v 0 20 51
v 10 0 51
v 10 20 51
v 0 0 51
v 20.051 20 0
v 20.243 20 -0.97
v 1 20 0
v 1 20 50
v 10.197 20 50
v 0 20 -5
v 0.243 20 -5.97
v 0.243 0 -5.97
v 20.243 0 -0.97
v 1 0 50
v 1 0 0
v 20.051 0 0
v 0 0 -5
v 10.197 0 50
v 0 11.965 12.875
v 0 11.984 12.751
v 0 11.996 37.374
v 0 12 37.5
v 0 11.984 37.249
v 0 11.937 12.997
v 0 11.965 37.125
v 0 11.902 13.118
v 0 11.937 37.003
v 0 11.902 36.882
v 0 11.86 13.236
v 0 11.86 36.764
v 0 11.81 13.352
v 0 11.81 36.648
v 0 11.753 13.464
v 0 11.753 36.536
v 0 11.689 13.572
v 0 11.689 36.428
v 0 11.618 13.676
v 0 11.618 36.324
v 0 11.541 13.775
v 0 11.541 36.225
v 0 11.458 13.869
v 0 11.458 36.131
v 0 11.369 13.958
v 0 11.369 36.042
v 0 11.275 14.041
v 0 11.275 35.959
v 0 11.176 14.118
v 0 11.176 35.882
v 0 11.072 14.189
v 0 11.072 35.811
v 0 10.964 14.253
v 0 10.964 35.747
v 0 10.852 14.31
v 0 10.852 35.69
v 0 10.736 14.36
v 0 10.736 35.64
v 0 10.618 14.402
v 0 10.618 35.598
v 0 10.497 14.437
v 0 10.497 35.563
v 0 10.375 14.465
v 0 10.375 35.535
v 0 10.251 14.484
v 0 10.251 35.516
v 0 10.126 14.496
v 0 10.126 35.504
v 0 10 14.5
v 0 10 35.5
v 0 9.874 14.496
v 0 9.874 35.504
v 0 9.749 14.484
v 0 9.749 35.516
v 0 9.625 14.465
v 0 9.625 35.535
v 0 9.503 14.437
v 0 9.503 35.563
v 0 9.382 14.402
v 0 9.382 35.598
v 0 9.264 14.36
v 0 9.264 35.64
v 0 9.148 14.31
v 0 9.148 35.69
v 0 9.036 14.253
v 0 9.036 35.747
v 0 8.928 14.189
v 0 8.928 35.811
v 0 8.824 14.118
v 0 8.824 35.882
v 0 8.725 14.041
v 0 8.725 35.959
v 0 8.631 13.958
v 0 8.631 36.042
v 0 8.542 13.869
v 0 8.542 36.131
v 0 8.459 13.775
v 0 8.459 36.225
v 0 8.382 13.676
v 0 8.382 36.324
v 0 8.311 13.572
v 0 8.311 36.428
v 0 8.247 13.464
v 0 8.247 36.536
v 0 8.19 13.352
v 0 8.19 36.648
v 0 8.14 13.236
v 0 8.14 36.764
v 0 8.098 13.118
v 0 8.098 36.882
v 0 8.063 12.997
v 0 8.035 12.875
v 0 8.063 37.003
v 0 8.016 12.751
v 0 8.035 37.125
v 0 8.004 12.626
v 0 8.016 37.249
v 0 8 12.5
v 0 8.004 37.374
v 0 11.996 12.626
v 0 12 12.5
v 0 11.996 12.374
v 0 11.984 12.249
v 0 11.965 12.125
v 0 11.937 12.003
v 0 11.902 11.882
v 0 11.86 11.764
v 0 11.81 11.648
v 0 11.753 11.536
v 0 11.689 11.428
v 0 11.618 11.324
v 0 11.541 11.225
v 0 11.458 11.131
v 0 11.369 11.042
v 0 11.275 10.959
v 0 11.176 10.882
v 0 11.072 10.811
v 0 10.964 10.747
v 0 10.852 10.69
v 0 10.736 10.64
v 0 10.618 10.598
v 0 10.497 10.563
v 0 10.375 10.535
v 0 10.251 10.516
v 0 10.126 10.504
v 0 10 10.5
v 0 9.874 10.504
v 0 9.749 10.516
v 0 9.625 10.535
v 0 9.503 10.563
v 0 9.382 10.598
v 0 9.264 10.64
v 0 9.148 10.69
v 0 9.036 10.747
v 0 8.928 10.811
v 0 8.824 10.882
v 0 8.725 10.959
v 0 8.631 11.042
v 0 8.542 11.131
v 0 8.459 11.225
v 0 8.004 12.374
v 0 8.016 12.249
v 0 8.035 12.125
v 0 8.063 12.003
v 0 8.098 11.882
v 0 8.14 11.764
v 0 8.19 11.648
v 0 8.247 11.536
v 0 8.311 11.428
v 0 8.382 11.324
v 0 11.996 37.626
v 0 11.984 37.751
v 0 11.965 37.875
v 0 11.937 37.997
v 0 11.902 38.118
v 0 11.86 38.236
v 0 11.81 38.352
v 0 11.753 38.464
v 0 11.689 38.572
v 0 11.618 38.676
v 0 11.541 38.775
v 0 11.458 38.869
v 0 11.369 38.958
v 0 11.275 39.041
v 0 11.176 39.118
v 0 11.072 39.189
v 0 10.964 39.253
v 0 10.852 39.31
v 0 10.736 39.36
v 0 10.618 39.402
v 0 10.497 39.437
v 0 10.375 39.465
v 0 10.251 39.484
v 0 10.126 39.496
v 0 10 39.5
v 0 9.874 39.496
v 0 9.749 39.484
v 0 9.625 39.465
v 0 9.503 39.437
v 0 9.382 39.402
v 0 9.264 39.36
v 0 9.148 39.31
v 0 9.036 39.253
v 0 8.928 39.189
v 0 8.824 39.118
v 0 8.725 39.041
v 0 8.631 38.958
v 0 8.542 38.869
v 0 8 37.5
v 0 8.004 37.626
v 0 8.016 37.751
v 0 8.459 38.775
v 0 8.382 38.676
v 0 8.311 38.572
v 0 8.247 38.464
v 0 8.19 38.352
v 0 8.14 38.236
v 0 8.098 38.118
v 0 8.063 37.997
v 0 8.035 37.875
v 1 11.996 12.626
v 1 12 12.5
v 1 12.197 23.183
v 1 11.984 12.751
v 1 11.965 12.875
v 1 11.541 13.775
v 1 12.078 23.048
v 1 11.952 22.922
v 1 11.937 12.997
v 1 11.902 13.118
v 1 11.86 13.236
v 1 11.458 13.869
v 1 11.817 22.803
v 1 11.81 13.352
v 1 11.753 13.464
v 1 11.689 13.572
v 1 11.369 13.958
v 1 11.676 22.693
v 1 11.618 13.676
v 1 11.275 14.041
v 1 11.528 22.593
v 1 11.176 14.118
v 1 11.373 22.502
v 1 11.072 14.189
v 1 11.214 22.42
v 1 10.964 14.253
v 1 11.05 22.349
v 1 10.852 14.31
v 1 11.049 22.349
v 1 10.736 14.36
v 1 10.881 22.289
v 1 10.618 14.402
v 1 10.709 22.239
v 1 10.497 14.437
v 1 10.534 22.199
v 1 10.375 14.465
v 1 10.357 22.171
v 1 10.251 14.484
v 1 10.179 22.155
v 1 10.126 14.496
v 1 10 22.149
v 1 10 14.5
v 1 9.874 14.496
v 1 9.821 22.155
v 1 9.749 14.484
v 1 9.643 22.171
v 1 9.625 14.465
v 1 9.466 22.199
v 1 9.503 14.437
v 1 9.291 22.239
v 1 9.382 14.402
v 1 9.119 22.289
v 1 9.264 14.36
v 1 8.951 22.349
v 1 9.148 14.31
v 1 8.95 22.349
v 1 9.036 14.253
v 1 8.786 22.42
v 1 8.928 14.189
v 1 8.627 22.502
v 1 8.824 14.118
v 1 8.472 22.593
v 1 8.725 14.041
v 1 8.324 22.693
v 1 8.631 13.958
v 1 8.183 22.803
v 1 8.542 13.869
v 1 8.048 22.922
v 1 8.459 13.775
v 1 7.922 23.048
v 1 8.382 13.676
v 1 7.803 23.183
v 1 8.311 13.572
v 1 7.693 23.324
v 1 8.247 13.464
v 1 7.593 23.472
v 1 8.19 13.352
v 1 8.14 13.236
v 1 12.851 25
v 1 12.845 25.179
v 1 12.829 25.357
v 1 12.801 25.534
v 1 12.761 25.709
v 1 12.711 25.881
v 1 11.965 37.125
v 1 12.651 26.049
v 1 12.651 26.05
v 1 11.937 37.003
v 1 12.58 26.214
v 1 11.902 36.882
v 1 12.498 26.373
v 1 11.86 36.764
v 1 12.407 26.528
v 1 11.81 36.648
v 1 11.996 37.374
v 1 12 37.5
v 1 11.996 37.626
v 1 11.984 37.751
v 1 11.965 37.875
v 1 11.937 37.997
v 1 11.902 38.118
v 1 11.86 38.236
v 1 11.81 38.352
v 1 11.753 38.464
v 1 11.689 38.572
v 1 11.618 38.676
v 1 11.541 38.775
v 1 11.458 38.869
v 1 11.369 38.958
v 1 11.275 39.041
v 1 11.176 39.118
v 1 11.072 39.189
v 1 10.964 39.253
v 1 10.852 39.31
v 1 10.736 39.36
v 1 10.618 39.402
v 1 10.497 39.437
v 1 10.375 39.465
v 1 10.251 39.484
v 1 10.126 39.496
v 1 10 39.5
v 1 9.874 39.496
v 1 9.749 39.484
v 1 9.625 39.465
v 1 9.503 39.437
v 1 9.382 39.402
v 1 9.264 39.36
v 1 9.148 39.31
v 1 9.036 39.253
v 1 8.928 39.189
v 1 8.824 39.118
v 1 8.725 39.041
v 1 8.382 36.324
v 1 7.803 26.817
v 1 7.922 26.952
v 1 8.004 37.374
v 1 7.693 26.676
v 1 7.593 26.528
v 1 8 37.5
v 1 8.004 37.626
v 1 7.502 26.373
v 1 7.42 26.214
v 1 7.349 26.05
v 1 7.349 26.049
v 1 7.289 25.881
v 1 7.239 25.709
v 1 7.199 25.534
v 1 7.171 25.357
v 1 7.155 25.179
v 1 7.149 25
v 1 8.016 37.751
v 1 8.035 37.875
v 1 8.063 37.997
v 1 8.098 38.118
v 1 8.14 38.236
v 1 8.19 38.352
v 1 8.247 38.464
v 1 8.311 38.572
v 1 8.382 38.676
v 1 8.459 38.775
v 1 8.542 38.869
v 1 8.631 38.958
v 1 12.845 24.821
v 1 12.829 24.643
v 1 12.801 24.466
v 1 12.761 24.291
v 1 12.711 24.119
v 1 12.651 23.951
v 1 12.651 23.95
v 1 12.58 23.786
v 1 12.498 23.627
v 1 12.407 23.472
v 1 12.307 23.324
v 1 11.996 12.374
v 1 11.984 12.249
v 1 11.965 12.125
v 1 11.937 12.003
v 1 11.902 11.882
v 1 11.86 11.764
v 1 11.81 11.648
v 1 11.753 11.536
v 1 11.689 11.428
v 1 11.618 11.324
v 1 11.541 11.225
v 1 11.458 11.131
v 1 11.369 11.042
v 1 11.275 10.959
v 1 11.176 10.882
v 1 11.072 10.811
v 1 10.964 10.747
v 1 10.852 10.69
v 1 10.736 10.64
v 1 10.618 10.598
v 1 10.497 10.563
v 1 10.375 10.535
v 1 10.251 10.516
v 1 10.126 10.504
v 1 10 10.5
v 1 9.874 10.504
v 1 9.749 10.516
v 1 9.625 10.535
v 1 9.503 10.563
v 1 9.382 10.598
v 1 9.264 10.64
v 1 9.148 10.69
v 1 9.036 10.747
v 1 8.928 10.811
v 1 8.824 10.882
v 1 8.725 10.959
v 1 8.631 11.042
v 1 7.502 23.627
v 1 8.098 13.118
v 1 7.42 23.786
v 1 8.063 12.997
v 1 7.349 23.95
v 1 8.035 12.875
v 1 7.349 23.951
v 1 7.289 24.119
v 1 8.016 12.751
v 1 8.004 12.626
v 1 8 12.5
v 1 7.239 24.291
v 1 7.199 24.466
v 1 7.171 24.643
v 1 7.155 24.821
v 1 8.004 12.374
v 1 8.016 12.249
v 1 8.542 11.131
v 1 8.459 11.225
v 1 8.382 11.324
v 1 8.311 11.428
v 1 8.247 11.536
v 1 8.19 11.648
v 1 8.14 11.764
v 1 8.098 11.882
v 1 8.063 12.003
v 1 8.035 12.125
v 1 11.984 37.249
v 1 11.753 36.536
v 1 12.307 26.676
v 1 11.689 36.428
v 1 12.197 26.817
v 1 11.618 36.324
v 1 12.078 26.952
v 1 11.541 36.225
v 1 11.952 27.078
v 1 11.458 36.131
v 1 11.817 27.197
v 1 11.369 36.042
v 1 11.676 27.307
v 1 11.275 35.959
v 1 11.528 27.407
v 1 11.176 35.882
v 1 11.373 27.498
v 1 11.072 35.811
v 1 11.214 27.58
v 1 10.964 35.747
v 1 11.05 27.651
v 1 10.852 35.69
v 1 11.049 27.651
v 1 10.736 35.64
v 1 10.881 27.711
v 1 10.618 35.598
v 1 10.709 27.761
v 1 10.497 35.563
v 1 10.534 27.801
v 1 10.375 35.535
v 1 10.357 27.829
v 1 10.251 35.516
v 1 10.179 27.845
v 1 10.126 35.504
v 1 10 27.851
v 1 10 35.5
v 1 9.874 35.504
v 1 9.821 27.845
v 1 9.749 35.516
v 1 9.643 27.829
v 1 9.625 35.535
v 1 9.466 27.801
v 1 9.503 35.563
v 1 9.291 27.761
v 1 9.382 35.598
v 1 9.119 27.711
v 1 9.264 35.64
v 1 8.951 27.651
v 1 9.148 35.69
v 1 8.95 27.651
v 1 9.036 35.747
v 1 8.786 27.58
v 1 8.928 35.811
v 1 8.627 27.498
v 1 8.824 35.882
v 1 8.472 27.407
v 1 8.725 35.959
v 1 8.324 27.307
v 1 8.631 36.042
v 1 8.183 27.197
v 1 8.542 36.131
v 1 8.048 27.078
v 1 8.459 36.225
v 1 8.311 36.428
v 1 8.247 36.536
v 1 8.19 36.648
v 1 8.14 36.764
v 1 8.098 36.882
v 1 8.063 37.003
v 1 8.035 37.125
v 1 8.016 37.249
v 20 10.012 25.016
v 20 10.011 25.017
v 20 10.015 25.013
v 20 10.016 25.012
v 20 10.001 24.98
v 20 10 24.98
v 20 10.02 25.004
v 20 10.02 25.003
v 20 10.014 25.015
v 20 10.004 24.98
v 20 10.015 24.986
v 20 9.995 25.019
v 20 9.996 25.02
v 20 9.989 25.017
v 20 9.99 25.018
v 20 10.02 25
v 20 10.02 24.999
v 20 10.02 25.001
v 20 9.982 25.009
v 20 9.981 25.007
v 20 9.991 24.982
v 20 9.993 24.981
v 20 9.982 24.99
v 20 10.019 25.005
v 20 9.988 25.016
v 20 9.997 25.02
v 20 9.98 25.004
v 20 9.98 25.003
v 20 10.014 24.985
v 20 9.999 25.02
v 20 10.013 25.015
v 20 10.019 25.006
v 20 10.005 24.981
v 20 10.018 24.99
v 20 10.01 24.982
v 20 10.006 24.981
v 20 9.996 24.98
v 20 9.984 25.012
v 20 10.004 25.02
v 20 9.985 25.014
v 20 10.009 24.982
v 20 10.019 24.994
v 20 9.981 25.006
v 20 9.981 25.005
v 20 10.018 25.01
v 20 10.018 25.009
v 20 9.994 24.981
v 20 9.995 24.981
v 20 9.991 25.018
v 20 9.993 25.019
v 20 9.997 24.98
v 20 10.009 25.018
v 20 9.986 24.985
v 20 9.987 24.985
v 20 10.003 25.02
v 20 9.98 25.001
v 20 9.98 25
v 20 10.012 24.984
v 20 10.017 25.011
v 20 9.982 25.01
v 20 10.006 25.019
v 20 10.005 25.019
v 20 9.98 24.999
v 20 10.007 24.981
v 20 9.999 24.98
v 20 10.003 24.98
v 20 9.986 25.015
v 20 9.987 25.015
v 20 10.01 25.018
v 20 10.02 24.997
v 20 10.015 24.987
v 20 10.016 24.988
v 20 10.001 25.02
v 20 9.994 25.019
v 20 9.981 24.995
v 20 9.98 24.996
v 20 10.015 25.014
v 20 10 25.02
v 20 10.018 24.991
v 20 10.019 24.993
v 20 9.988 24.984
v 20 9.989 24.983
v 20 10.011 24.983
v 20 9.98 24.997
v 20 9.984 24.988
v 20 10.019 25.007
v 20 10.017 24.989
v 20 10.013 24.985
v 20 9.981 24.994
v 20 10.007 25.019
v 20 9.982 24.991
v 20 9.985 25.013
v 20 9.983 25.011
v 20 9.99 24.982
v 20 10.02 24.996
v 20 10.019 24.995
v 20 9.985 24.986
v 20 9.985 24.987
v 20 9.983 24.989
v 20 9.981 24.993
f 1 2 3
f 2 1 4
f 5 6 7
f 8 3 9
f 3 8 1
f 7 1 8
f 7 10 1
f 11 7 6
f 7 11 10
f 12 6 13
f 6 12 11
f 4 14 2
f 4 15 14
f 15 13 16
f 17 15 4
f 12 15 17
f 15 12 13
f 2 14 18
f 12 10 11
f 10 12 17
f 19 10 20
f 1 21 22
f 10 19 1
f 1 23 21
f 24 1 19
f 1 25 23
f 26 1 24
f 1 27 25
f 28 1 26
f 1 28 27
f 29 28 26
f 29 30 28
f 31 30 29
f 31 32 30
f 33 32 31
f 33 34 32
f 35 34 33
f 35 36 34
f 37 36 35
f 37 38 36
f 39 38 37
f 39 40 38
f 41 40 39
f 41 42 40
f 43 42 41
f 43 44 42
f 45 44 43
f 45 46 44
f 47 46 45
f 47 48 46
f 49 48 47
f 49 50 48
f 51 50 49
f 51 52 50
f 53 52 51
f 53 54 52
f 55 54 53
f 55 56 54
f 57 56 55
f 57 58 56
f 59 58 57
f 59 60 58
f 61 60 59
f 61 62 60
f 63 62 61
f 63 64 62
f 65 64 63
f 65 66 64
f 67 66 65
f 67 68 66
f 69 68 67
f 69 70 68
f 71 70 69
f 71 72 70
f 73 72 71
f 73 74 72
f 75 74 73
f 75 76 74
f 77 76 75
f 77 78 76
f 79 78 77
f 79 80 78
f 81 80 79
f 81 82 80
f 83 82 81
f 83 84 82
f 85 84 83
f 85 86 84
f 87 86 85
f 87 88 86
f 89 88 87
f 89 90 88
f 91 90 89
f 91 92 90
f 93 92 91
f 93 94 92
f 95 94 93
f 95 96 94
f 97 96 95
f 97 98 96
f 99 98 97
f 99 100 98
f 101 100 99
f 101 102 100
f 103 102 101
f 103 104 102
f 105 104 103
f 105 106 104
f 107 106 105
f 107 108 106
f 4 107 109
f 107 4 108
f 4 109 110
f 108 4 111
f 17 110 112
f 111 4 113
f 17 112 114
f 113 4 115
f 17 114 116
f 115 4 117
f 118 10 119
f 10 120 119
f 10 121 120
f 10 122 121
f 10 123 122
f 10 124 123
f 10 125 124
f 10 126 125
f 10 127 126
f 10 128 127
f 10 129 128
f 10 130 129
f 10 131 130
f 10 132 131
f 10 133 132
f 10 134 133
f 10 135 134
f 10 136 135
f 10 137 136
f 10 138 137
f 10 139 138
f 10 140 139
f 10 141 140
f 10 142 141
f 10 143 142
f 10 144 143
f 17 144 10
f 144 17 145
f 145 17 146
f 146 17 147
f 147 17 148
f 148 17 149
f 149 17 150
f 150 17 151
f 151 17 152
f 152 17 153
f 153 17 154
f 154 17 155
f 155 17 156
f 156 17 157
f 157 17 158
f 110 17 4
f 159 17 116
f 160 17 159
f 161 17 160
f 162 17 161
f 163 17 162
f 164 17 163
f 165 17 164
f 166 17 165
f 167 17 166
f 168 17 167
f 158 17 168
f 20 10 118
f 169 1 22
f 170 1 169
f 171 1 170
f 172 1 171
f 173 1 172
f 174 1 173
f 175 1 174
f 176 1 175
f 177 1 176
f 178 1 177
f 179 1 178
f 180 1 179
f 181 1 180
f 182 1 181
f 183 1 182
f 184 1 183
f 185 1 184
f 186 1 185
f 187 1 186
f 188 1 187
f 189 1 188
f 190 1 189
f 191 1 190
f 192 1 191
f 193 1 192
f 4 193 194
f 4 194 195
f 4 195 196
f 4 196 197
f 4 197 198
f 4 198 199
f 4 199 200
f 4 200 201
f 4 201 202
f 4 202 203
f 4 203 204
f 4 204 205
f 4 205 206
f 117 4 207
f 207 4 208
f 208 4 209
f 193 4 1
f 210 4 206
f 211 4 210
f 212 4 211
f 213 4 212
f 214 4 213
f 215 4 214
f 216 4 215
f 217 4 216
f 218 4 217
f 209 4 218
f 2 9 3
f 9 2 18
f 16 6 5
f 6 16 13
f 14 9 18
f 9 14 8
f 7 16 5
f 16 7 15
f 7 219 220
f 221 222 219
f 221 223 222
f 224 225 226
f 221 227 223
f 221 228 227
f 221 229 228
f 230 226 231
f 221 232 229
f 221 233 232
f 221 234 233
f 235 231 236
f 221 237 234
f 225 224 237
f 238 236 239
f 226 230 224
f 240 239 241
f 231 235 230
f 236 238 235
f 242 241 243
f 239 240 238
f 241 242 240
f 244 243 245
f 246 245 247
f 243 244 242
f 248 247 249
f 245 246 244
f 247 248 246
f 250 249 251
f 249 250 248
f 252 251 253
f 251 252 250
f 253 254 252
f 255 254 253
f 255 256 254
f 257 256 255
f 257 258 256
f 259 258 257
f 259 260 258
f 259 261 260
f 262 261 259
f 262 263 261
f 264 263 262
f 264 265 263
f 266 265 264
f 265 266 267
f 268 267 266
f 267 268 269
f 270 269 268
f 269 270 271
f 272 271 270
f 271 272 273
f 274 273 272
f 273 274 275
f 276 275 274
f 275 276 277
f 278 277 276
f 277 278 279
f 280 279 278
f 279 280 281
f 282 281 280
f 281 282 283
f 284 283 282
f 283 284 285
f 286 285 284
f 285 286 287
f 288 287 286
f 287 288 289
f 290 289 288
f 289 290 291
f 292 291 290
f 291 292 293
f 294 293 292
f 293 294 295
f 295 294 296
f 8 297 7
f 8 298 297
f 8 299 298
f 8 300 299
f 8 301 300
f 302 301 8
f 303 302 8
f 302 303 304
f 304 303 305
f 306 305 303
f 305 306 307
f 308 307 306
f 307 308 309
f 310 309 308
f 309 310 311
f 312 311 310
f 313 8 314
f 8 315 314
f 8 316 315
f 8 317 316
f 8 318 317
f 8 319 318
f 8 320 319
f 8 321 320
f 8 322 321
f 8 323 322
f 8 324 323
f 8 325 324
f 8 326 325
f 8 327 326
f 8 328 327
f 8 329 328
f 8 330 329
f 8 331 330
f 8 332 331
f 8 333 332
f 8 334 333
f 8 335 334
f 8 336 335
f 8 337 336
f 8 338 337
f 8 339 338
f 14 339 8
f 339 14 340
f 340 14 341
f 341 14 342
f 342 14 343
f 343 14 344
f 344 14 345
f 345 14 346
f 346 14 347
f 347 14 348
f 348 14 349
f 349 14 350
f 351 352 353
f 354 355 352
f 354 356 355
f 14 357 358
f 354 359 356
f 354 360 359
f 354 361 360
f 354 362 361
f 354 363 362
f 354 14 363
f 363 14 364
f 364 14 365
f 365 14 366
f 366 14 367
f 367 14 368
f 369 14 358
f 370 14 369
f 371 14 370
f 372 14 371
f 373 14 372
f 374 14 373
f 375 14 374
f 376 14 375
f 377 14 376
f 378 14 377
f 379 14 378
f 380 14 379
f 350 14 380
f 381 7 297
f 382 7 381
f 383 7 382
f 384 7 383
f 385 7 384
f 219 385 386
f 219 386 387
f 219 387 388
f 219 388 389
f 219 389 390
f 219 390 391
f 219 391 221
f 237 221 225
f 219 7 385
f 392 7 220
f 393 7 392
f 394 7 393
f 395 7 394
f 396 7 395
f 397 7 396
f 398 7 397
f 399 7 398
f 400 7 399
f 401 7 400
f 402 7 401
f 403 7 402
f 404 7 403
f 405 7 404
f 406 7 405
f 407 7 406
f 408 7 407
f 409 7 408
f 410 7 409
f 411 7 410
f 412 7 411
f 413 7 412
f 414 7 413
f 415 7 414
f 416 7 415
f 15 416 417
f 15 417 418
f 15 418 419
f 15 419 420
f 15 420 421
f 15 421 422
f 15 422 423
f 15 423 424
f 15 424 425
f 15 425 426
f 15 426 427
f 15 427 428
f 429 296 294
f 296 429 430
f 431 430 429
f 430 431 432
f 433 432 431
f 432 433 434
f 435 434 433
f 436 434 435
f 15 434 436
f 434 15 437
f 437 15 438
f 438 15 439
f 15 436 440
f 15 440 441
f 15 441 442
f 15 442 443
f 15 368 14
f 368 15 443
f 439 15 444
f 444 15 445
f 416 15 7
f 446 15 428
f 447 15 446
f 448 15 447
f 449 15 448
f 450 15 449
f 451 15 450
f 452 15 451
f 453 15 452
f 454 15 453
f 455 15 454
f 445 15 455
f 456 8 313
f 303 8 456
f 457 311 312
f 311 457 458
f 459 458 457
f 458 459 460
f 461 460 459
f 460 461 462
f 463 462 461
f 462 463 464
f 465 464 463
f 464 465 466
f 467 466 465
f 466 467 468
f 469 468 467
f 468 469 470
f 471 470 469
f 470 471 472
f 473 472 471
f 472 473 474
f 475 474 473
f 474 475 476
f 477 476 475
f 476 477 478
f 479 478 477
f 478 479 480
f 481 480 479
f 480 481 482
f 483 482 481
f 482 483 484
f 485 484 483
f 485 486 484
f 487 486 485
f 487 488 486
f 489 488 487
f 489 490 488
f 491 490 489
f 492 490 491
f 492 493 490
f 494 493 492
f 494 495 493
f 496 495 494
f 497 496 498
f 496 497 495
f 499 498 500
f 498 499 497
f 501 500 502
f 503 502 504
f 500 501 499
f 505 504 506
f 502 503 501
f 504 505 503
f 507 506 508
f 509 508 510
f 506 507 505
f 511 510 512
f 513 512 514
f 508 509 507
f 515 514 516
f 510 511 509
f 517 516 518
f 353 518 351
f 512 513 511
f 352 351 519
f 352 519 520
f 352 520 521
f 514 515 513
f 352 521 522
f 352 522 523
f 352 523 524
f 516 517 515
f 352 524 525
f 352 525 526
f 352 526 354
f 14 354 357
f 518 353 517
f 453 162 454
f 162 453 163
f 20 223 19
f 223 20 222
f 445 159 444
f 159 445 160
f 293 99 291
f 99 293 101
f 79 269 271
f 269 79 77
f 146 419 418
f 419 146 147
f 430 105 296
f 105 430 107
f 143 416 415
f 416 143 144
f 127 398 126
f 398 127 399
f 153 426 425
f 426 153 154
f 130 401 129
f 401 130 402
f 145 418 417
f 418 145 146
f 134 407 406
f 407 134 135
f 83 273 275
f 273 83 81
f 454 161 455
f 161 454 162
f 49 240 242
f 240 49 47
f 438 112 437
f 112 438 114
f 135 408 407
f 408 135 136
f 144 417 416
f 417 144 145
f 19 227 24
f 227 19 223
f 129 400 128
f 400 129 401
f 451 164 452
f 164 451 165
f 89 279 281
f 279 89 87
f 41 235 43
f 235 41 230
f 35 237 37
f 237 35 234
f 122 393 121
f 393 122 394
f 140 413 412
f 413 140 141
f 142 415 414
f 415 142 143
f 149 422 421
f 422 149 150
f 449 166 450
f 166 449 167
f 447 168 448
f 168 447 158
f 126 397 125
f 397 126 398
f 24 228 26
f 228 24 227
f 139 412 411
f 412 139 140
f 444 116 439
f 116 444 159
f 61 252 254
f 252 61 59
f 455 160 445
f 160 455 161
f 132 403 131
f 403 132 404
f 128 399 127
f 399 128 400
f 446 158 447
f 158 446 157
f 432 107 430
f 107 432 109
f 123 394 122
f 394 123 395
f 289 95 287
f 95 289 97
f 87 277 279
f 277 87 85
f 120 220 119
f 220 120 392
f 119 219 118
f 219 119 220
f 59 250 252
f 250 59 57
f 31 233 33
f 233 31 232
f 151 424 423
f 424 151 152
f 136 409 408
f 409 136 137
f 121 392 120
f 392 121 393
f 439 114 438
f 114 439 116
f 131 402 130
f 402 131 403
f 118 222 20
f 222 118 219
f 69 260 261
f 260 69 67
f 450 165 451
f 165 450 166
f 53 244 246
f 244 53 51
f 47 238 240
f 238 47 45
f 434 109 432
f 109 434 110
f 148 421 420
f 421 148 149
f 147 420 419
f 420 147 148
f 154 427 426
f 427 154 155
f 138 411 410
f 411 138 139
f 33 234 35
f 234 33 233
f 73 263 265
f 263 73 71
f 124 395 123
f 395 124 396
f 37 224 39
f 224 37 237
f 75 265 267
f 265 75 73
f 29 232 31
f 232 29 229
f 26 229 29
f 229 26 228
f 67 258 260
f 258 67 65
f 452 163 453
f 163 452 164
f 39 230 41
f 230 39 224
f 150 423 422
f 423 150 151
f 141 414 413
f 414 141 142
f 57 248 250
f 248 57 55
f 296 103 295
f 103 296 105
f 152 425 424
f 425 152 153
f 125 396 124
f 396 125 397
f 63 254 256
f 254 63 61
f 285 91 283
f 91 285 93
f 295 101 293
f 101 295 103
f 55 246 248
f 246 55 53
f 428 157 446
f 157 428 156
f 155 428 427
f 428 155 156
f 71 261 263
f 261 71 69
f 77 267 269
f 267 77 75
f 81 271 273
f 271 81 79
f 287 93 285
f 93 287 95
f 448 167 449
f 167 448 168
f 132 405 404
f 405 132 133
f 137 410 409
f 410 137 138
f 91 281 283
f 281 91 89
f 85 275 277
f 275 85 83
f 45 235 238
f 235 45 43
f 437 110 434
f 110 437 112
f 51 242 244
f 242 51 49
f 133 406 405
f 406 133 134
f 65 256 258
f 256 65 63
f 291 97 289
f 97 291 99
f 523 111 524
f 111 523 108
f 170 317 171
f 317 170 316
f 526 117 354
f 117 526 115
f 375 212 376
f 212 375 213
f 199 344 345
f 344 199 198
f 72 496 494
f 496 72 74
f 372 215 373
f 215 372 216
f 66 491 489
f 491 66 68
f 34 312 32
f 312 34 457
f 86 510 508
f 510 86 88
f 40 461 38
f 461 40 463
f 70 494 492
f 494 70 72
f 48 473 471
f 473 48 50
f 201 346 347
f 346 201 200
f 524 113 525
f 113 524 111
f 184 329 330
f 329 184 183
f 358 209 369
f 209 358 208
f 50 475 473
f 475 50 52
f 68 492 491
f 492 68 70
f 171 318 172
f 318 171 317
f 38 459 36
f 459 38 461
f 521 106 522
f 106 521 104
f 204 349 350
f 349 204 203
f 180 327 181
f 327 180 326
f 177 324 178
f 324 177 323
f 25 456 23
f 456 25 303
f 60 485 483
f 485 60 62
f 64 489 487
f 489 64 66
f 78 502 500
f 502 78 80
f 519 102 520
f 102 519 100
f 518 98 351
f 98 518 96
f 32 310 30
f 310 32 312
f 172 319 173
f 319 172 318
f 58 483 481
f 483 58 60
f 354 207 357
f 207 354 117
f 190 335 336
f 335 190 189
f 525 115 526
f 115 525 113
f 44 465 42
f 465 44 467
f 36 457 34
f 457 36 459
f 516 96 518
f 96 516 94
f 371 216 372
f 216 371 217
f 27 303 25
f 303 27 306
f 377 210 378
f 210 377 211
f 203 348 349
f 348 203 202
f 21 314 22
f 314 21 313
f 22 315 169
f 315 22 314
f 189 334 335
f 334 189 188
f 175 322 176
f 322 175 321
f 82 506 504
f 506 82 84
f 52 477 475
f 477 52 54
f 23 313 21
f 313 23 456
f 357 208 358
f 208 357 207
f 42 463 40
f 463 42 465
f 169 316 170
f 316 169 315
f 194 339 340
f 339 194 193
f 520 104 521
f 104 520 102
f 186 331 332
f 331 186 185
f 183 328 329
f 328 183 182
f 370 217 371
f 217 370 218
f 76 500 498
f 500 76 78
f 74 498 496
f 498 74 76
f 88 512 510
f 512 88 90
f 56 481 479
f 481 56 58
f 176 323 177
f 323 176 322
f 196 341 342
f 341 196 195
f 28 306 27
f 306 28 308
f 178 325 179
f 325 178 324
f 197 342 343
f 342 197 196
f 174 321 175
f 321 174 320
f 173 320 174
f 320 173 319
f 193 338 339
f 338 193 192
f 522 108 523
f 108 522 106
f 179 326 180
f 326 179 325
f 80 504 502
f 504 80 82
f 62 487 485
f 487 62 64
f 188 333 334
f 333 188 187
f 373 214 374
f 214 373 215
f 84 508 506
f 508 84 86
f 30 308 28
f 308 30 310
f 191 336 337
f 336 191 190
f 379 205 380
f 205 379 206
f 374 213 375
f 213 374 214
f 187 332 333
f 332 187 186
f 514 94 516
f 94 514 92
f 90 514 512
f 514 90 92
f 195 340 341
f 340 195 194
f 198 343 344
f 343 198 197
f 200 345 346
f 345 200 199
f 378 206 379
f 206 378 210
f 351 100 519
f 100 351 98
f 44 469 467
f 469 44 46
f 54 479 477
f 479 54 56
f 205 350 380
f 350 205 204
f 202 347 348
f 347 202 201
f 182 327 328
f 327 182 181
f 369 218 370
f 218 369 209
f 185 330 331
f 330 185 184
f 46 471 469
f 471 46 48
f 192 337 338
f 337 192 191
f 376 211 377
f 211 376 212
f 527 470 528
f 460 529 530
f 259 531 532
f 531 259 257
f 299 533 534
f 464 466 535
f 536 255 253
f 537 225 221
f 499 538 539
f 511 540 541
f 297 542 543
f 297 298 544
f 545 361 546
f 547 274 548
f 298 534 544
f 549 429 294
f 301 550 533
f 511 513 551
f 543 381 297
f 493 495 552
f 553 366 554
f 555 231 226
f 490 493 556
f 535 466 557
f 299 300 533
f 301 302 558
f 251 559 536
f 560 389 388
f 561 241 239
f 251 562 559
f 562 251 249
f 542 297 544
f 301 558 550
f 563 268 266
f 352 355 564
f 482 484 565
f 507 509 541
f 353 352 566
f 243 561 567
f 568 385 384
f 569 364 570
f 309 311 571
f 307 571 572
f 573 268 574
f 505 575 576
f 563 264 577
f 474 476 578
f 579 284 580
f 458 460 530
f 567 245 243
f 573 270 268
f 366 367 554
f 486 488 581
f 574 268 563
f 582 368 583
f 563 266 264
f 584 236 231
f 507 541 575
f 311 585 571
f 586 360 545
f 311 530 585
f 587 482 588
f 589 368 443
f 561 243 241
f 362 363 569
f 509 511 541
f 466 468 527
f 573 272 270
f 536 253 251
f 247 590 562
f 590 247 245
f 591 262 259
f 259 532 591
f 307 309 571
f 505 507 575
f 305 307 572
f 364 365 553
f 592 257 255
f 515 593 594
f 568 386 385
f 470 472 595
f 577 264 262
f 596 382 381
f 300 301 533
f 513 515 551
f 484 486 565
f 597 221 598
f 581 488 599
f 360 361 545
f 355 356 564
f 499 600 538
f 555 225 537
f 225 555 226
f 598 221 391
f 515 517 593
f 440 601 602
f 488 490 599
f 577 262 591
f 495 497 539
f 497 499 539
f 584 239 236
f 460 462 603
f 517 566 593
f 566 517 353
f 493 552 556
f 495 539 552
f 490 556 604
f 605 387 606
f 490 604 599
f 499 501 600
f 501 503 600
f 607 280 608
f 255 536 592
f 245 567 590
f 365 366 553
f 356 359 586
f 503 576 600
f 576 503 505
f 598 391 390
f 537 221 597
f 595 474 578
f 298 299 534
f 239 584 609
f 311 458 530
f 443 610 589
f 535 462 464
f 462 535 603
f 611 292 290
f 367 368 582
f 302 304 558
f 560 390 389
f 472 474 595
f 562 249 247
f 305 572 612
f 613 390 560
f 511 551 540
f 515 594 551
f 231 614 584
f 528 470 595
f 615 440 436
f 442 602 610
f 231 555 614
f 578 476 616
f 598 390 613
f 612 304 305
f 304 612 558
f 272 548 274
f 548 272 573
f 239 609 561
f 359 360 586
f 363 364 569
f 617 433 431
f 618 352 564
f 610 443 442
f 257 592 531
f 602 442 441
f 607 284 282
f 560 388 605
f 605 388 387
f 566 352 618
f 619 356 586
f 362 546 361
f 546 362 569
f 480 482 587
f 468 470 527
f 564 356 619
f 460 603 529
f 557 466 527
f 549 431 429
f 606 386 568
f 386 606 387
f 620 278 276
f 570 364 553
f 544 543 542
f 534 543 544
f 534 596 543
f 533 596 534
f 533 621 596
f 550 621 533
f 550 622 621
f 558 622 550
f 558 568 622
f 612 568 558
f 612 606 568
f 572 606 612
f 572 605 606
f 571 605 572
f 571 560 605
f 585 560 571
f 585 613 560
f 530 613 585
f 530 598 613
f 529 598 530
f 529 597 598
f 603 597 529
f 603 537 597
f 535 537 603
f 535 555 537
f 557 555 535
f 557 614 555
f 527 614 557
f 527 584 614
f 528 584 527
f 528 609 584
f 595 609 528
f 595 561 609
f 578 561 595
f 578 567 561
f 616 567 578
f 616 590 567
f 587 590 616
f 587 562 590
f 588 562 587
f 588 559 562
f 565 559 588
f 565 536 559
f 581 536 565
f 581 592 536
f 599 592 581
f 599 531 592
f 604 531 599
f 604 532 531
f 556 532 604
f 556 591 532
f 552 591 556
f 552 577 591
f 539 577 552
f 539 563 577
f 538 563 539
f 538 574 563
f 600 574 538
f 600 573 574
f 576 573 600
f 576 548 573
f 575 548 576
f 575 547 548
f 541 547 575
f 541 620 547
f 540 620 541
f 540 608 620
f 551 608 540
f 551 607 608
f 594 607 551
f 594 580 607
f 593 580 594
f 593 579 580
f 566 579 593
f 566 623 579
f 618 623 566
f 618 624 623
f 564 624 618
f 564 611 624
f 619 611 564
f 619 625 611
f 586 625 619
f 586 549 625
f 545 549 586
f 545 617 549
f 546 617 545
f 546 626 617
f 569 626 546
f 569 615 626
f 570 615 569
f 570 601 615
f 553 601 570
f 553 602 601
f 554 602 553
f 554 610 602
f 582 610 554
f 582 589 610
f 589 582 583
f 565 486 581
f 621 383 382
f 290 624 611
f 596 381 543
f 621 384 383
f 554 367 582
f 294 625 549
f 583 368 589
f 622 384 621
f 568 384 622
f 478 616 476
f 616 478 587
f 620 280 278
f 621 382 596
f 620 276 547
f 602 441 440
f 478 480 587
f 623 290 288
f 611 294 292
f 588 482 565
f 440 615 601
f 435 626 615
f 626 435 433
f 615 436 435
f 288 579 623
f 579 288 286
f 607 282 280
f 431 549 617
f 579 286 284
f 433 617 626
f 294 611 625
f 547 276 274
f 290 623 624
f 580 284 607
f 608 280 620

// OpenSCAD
foam_thickness = 50;

bracket_width = 1;
bracket_depth = 20;
bracket_height = foam_thickness;

bottom_support_width = 1;
bottom_support_depth = 20;
// MATH FOR BOTTOM SUPPORT HEIGHT
    bottom_support_a = 5;
    bottom_support_b = 20;
    bottom_support_c = sqrt(pow(bottom_support_a, 2) + pow(bottom_support_b, 2));
    echo(bottom_support_c);
bottom_support_height = bottom_support_c;

// MATH 
bottom_support_angle = 90 - acos(bottom_support_b / bottom_support_c);
echo(bottom_support_height);


spike_height = 20;
spike_bottom_r = 3;
spike_top_r = .02;

// CYLANDER ROUNDNESS
$fn = 100;

// MATH FOR SPIKE PLACEMENT
spike_x_offset = (bracket_height / 4);

screw_height = bracket_width + 2;
screw_r = 2;

difference() {
    hull() {
        cube([bracket_width, bracket_depth, bracket_height]);
        translate([0, 0, (bottom_support_a * -1)]) {
            rotate([0, bottom_support_angle, 0]) {
                cube([bottom_support_width, bottom_support_depth, bottom_support_height]);
            }
        }
        translate([0, 0, (bracket_height + bottom_support_width)]) {
            rotate([0, 90, 0]) {
                cube([bottom_support_width, bottom_support_depth, 10]);
            }
        }    
    }

    translate([bracket_width, 0, 0]) {
        cube([bracket_height, bracket_depth, bracket_height]);
    }
    
    translate([0, (bracket_depth / 2), spike_x_offset]) {
        rotate([0, 90, 0]) {
            cylinder(h=screw_height, r=screw_r);
        }
    }

    translate([0, (bracket_depth / 2), (bracket_height - spike_x_offset)]) {
        rotate([0, 90, 0]) {
            cylinder(h=screw_height, r=screw_r);
        }
    }
}



translate([0, (bracket_depth / 2), (bracket_height / 2)]) {
    rotate([0, 90, 0]) {
        cylinder(spike_height, spike_bottom_r, spike_top_r);
    }
}
